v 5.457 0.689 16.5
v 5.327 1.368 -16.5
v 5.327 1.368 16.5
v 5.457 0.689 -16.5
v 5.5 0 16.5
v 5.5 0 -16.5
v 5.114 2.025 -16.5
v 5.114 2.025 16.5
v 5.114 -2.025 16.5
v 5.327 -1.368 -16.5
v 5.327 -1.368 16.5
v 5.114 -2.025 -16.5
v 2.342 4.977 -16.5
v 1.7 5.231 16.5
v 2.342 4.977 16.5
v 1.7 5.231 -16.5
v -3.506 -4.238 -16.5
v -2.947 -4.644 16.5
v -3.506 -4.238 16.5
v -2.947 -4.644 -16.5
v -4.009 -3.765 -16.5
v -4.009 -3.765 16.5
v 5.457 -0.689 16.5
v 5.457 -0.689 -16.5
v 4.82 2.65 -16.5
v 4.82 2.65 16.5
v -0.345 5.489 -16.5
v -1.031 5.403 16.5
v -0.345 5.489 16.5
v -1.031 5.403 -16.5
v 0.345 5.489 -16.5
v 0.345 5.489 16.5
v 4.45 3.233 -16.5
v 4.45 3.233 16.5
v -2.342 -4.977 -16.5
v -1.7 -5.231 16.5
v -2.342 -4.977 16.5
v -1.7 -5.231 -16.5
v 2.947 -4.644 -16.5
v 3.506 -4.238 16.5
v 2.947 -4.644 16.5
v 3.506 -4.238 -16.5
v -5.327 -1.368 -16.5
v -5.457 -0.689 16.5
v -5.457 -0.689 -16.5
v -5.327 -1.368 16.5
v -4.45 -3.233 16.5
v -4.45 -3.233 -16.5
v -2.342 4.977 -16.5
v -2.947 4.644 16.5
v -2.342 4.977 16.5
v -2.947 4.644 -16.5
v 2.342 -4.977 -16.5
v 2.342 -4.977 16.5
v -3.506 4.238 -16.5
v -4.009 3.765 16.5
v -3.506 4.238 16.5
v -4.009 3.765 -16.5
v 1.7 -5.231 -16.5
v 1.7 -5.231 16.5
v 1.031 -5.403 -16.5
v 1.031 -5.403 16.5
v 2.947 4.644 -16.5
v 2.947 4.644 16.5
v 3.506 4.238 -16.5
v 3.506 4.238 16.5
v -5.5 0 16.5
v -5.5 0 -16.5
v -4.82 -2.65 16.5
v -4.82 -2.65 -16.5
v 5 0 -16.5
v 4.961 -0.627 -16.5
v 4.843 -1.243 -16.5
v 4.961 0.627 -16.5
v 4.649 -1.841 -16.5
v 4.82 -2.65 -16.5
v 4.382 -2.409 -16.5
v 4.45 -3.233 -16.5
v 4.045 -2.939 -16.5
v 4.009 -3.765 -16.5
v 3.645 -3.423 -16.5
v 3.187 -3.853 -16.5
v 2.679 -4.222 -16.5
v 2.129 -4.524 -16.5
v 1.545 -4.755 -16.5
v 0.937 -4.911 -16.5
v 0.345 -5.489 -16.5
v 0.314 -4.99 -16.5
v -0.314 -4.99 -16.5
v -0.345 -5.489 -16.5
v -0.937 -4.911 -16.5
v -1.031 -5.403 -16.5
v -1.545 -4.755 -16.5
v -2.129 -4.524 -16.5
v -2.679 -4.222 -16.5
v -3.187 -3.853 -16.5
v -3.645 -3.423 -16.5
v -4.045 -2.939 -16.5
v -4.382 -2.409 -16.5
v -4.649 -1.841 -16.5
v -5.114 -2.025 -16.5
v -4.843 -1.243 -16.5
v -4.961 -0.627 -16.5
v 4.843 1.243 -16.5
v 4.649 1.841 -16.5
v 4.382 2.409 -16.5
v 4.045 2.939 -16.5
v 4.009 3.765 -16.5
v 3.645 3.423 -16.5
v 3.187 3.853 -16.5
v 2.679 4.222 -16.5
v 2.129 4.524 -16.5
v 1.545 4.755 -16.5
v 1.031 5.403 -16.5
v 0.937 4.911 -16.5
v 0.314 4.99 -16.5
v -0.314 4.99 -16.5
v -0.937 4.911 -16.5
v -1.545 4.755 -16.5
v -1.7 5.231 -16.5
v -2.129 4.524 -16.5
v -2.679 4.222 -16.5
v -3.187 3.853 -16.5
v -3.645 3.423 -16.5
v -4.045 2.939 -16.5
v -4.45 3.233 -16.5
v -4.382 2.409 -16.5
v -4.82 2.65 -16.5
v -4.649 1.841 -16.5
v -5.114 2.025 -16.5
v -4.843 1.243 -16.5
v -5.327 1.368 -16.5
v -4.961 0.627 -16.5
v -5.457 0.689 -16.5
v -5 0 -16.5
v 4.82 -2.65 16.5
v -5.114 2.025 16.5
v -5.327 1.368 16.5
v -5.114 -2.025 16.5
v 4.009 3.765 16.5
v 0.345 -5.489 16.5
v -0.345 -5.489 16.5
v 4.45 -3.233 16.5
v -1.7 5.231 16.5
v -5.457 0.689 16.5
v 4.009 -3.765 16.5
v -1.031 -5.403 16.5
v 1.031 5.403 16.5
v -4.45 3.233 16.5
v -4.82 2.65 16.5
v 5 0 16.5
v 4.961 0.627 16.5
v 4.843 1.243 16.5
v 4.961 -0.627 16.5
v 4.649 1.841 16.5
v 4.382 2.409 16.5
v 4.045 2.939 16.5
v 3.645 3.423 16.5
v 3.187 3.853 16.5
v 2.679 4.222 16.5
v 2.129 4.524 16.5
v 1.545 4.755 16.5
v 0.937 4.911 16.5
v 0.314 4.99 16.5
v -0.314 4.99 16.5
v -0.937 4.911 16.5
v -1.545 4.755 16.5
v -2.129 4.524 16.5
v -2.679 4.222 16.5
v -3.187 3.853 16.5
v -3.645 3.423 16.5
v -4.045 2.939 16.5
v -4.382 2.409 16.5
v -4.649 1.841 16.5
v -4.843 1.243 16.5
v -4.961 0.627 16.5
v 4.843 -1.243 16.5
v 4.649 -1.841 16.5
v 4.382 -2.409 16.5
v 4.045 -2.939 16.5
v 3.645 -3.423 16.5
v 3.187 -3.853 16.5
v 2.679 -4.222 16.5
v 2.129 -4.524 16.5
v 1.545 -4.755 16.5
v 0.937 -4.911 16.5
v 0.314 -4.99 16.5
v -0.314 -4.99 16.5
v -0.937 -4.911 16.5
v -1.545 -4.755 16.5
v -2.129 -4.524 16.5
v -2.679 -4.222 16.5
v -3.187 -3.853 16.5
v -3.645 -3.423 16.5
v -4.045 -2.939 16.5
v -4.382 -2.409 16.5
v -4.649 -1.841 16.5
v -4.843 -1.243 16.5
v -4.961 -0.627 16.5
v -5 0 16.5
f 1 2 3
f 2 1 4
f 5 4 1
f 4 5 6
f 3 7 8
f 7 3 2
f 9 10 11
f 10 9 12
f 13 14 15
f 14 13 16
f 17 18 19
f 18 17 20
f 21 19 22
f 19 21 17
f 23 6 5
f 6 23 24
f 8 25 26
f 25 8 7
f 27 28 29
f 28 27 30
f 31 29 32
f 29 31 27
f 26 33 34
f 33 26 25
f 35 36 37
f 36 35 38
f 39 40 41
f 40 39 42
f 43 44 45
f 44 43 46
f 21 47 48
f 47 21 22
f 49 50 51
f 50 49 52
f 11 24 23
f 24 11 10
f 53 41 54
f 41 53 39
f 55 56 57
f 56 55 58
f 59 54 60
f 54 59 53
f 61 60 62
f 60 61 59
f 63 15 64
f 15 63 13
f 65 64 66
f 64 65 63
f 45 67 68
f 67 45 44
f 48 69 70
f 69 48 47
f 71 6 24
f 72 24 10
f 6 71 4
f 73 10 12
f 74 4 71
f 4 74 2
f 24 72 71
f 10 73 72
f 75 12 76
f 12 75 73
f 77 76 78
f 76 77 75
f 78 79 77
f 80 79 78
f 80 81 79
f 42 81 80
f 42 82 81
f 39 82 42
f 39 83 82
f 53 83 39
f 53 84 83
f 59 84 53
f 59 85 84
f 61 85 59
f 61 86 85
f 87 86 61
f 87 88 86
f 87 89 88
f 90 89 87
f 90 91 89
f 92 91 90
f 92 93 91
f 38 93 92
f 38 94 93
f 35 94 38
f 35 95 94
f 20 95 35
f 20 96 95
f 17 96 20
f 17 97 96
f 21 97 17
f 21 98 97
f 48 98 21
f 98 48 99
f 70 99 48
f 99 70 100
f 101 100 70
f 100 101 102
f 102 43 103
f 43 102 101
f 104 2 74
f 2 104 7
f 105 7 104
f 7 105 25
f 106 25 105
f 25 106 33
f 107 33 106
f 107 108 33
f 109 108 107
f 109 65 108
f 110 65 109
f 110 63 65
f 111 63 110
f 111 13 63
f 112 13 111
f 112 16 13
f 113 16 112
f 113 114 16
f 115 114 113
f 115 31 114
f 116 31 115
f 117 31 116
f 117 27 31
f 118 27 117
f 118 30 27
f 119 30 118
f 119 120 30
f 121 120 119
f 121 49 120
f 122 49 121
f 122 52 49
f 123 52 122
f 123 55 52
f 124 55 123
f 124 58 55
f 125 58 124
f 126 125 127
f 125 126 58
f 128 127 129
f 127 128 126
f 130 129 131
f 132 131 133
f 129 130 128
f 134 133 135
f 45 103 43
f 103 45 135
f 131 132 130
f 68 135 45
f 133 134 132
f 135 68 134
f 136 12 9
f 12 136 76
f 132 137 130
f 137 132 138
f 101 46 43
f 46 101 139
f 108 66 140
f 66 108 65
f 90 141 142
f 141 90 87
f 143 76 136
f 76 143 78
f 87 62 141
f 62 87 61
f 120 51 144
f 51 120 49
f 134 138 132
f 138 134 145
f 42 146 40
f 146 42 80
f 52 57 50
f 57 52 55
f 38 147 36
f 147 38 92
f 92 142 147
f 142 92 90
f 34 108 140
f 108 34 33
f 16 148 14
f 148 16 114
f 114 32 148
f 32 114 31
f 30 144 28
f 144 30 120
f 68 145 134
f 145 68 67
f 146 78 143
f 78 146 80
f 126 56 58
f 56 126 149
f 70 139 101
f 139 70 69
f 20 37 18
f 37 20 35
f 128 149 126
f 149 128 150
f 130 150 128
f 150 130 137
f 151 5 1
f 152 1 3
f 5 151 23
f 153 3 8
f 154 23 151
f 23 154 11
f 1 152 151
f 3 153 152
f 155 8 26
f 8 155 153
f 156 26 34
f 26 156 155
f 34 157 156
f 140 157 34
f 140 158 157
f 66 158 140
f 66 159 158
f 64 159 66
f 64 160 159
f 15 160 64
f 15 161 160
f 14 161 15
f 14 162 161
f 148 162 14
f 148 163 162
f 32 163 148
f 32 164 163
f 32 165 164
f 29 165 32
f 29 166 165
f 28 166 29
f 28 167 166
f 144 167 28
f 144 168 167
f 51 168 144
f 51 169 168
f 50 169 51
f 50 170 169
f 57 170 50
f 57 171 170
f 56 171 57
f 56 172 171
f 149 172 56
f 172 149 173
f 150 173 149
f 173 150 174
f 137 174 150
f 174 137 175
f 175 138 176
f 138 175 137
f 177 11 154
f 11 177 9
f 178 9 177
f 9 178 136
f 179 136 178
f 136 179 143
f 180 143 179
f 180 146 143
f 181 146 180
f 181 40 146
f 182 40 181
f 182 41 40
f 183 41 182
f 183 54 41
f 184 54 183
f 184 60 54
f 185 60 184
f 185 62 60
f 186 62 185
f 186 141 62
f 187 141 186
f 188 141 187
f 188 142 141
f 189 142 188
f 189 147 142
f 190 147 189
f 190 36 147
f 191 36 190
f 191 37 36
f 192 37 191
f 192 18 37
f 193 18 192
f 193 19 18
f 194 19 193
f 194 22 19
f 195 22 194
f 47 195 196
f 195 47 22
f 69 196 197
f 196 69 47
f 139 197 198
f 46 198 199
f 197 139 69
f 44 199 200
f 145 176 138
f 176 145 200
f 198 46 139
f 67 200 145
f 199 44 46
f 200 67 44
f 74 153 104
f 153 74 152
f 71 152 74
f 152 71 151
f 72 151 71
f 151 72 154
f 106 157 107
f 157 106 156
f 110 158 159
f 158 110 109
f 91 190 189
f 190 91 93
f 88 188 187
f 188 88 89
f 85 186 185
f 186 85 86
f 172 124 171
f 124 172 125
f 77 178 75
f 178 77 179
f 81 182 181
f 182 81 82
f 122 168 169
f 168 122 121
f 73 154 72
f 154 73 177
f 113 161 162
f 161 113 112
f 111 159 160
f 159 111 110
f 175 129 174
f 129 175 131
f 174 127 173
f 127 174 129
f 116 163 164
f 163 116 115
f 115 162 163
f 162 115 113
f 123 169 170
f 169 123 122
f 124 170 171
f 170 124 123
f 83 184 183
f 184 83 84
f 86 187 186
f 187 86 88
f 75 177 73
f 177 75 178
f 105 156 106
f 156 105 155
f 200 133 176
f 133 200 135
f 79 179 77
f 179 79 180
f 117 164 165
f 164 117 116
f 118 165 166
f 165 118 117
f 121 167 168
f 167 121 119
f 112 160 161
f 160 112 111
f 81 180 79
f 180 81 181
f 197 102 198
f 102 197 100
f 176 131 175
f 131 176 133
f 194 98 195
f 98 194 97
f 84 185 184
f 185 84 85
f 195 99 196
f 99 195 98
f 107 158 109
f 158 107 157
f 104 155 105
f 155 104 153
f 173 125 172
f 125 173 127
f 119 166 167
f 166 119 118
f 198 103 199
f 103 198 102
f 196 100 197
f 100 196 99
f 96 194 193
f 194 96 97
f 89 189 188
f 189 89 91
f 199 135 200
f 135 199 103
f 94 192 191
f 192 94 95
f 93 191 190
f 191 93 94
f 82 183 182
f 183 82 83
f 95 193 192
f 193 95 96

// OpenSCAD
$fn = 50;


difference() {
	union() {
		translate(v = [0, 0, -16.5000000000]) {
			cylinder(h = 33, r = 5.5000000000);
		}
	}
	union() {
		translate(v = [0, 0, -100.0000000000]) {
			cylinder(h = 200, r = 5.0000000000);
		}
	}
}
